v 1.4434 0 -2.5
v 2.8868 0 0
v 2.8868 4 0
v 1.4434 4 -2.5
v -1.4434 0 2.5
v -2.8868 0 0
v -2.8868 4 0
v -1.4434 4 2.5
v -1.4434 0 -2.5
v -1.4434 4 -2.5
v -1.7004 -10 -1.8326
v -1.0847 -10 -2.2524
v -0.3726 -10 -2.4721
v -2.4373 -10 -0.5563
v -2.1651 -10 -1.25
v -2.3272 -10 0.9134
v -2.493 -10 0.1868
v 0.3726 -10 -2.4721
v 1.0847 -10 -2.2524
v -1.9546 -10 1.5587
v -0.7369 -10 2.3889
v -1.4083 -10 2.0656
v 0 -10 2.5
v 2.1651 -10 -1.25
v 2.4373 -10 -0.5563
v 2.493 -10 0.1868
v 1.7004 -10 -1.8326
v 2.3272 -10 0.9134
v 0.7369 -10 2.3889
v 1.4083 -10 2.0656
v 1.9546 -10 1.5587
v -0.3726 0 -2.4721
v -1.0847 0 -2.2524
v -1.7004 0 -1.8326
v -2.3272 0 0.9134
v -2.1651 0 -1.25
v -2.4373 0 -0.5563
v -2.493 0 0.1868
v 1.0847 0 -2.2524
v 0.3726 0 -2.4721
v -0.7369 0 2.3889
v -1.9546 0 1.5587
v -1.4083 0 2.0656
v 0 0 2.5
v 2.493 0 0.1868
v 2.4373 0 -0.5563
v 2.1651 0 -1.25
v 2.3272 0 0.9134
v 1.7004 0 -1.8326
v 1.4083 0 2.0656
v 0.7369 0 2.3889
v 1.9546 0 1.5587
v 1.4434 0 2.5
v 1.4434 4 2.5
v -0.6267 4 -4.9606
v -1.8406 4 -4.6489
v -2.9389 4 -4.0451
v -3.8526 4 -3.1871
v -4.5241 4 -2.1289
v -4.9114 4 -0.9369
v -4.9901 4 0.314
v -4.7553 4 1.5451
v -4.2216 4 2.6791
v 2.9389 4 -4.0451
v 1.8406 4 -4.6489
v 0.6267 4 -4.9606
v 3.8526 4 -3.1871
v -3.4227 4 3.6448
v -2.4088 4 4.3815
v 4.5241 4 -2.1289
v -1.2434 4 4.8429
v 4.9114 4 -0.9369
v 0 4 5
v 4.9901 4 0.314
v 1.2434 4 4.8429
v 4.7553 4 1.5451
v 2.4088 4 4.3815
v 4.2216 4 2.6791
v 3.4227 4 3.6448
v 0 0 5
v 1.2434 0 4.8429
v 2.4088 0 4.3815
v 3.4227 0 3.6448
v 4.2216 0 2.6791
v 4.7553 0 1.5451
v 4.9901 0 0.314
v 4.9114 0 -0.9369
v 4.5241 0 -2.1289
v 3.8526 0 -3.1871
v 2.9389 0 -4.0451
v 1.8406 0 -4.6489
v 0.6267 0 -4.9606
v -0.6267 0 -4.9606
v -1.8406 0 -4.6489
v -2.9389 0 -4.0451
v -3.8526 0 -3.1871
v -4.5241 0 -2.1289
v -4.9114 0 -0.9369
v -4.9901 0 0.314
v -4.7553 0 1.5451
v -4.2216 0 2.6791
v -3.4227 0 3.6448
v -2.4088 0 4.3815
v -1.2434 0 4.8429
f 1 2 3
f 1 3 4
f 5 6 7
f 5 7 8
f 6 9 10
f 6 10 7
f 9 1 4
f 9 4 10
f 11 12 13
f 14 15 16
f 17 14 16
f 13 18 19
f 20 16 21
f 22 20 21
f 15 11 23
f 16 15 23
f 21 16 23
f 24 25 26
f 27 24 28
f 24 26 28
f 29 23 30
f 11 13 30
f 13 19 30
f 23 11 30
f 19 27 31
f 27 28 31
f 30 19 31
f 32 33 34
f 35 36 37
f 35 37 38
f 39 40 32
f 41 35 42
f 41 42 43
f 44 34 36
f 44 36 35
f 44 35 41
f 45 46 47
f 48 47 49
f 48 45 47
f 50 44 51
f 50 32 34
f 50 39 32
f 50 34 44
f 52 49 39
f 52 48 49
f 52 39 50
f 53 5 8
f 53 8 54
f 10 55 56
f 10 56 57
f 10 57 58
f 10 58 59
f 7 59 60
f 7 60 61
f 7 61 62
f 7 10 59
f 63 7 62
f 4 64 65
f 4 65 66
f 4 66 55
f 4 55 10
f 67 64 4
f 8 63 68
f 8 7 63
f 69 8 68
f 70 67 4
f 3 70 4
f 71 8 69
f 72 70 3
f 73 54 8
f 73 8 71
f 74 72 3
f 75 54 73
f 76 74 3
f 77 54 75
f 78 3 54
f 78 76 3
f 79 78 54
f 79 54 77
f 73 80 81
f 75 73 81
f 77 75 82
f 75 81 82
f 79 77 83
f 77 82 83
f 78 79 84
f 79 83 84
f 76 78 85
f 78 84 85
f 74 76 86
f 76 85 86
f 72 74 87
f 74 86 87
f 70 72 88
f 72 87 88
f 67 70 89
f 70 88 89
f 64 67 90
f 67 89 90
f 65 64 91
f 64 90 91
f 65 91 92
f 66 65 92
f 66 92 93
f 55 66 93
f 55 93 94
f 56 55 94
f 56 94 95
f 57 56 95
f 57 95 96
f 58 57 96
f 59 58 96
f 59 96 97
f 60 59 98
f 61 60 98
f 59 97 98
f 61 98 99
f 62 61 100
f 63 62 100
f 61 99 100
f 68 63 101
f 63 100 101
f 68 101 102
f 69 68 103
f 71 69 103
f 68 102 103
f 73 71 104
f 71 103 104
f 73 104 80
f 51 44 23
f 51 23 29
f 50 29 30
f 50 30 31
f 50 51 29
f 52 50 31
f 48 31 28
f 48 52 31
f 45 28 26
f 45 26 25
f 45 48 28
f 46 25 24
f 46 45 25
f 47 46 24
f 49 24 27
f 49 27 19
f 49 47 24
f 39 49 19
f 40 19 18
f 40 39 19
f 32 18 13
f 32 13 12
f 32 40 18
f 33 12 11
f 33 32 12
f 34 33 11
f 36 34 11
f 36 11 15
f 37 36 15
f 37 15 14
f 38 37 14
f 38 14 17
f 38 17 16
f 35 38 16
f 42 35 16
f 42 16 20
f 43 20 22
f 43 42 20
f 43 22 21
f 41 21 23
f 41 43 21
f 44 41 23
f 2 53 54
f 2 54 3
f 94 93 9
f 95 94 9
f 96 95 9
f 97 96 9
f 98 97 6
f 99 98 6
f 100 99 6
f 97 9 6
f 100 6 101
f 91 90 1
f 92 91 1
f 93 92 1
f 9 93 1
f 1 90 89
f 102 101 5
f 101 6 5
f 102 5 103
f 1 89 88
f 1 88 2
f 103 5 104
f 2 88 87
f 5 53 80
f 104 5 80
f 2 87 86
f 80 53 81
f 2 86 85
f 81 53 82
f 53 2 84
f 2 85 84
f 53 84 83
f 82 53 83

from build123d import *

# Parameters (mm, degrees)
SKETCH1_R      = 2.5
EXTRUDE1_DEPTH = 10
SKETCH2_R      = 5
EXTRUDE2_DEPTH = 4


with BuildPart() as part:
    # Sketch1 → Extrude1 (new body)
    with BuildSketch(Plane(origin=(0, 0, 0), x_dir=(1, 0, 0), z_dir=(0, 1, 0))):
        with Locations(Location((0, 0, 0), (0, 0, 270))):
            Circle(SKETCH1_R)
    extrude(amount=-EXTRUDE1_DEPTH)


with BuildPart() as body_2:
    # Sketch2 → Extrude2 (new body)
    with BuildSketch(Plane(origin=(0, 0, 0), x_dir=(1, 0, 0), z_dir=(0, 1, 0))):
        with Locations(Location((0, 0, 0), (0, 0, 270))):
            Circle(SKETCH2_R)
        Polygon((2.886751346, 0), (1.443375673, 2.5), (-1.443375673, 2.5), (-2.886751346, 0), (-1.443375673, -2.5), (1.443375673, -2.5), align=None, mode=Mode.SUBTRACT)
    extrude(amount=EXTRUDE2_DEPTH)


solid = Compound([part.part, body_2.part])
